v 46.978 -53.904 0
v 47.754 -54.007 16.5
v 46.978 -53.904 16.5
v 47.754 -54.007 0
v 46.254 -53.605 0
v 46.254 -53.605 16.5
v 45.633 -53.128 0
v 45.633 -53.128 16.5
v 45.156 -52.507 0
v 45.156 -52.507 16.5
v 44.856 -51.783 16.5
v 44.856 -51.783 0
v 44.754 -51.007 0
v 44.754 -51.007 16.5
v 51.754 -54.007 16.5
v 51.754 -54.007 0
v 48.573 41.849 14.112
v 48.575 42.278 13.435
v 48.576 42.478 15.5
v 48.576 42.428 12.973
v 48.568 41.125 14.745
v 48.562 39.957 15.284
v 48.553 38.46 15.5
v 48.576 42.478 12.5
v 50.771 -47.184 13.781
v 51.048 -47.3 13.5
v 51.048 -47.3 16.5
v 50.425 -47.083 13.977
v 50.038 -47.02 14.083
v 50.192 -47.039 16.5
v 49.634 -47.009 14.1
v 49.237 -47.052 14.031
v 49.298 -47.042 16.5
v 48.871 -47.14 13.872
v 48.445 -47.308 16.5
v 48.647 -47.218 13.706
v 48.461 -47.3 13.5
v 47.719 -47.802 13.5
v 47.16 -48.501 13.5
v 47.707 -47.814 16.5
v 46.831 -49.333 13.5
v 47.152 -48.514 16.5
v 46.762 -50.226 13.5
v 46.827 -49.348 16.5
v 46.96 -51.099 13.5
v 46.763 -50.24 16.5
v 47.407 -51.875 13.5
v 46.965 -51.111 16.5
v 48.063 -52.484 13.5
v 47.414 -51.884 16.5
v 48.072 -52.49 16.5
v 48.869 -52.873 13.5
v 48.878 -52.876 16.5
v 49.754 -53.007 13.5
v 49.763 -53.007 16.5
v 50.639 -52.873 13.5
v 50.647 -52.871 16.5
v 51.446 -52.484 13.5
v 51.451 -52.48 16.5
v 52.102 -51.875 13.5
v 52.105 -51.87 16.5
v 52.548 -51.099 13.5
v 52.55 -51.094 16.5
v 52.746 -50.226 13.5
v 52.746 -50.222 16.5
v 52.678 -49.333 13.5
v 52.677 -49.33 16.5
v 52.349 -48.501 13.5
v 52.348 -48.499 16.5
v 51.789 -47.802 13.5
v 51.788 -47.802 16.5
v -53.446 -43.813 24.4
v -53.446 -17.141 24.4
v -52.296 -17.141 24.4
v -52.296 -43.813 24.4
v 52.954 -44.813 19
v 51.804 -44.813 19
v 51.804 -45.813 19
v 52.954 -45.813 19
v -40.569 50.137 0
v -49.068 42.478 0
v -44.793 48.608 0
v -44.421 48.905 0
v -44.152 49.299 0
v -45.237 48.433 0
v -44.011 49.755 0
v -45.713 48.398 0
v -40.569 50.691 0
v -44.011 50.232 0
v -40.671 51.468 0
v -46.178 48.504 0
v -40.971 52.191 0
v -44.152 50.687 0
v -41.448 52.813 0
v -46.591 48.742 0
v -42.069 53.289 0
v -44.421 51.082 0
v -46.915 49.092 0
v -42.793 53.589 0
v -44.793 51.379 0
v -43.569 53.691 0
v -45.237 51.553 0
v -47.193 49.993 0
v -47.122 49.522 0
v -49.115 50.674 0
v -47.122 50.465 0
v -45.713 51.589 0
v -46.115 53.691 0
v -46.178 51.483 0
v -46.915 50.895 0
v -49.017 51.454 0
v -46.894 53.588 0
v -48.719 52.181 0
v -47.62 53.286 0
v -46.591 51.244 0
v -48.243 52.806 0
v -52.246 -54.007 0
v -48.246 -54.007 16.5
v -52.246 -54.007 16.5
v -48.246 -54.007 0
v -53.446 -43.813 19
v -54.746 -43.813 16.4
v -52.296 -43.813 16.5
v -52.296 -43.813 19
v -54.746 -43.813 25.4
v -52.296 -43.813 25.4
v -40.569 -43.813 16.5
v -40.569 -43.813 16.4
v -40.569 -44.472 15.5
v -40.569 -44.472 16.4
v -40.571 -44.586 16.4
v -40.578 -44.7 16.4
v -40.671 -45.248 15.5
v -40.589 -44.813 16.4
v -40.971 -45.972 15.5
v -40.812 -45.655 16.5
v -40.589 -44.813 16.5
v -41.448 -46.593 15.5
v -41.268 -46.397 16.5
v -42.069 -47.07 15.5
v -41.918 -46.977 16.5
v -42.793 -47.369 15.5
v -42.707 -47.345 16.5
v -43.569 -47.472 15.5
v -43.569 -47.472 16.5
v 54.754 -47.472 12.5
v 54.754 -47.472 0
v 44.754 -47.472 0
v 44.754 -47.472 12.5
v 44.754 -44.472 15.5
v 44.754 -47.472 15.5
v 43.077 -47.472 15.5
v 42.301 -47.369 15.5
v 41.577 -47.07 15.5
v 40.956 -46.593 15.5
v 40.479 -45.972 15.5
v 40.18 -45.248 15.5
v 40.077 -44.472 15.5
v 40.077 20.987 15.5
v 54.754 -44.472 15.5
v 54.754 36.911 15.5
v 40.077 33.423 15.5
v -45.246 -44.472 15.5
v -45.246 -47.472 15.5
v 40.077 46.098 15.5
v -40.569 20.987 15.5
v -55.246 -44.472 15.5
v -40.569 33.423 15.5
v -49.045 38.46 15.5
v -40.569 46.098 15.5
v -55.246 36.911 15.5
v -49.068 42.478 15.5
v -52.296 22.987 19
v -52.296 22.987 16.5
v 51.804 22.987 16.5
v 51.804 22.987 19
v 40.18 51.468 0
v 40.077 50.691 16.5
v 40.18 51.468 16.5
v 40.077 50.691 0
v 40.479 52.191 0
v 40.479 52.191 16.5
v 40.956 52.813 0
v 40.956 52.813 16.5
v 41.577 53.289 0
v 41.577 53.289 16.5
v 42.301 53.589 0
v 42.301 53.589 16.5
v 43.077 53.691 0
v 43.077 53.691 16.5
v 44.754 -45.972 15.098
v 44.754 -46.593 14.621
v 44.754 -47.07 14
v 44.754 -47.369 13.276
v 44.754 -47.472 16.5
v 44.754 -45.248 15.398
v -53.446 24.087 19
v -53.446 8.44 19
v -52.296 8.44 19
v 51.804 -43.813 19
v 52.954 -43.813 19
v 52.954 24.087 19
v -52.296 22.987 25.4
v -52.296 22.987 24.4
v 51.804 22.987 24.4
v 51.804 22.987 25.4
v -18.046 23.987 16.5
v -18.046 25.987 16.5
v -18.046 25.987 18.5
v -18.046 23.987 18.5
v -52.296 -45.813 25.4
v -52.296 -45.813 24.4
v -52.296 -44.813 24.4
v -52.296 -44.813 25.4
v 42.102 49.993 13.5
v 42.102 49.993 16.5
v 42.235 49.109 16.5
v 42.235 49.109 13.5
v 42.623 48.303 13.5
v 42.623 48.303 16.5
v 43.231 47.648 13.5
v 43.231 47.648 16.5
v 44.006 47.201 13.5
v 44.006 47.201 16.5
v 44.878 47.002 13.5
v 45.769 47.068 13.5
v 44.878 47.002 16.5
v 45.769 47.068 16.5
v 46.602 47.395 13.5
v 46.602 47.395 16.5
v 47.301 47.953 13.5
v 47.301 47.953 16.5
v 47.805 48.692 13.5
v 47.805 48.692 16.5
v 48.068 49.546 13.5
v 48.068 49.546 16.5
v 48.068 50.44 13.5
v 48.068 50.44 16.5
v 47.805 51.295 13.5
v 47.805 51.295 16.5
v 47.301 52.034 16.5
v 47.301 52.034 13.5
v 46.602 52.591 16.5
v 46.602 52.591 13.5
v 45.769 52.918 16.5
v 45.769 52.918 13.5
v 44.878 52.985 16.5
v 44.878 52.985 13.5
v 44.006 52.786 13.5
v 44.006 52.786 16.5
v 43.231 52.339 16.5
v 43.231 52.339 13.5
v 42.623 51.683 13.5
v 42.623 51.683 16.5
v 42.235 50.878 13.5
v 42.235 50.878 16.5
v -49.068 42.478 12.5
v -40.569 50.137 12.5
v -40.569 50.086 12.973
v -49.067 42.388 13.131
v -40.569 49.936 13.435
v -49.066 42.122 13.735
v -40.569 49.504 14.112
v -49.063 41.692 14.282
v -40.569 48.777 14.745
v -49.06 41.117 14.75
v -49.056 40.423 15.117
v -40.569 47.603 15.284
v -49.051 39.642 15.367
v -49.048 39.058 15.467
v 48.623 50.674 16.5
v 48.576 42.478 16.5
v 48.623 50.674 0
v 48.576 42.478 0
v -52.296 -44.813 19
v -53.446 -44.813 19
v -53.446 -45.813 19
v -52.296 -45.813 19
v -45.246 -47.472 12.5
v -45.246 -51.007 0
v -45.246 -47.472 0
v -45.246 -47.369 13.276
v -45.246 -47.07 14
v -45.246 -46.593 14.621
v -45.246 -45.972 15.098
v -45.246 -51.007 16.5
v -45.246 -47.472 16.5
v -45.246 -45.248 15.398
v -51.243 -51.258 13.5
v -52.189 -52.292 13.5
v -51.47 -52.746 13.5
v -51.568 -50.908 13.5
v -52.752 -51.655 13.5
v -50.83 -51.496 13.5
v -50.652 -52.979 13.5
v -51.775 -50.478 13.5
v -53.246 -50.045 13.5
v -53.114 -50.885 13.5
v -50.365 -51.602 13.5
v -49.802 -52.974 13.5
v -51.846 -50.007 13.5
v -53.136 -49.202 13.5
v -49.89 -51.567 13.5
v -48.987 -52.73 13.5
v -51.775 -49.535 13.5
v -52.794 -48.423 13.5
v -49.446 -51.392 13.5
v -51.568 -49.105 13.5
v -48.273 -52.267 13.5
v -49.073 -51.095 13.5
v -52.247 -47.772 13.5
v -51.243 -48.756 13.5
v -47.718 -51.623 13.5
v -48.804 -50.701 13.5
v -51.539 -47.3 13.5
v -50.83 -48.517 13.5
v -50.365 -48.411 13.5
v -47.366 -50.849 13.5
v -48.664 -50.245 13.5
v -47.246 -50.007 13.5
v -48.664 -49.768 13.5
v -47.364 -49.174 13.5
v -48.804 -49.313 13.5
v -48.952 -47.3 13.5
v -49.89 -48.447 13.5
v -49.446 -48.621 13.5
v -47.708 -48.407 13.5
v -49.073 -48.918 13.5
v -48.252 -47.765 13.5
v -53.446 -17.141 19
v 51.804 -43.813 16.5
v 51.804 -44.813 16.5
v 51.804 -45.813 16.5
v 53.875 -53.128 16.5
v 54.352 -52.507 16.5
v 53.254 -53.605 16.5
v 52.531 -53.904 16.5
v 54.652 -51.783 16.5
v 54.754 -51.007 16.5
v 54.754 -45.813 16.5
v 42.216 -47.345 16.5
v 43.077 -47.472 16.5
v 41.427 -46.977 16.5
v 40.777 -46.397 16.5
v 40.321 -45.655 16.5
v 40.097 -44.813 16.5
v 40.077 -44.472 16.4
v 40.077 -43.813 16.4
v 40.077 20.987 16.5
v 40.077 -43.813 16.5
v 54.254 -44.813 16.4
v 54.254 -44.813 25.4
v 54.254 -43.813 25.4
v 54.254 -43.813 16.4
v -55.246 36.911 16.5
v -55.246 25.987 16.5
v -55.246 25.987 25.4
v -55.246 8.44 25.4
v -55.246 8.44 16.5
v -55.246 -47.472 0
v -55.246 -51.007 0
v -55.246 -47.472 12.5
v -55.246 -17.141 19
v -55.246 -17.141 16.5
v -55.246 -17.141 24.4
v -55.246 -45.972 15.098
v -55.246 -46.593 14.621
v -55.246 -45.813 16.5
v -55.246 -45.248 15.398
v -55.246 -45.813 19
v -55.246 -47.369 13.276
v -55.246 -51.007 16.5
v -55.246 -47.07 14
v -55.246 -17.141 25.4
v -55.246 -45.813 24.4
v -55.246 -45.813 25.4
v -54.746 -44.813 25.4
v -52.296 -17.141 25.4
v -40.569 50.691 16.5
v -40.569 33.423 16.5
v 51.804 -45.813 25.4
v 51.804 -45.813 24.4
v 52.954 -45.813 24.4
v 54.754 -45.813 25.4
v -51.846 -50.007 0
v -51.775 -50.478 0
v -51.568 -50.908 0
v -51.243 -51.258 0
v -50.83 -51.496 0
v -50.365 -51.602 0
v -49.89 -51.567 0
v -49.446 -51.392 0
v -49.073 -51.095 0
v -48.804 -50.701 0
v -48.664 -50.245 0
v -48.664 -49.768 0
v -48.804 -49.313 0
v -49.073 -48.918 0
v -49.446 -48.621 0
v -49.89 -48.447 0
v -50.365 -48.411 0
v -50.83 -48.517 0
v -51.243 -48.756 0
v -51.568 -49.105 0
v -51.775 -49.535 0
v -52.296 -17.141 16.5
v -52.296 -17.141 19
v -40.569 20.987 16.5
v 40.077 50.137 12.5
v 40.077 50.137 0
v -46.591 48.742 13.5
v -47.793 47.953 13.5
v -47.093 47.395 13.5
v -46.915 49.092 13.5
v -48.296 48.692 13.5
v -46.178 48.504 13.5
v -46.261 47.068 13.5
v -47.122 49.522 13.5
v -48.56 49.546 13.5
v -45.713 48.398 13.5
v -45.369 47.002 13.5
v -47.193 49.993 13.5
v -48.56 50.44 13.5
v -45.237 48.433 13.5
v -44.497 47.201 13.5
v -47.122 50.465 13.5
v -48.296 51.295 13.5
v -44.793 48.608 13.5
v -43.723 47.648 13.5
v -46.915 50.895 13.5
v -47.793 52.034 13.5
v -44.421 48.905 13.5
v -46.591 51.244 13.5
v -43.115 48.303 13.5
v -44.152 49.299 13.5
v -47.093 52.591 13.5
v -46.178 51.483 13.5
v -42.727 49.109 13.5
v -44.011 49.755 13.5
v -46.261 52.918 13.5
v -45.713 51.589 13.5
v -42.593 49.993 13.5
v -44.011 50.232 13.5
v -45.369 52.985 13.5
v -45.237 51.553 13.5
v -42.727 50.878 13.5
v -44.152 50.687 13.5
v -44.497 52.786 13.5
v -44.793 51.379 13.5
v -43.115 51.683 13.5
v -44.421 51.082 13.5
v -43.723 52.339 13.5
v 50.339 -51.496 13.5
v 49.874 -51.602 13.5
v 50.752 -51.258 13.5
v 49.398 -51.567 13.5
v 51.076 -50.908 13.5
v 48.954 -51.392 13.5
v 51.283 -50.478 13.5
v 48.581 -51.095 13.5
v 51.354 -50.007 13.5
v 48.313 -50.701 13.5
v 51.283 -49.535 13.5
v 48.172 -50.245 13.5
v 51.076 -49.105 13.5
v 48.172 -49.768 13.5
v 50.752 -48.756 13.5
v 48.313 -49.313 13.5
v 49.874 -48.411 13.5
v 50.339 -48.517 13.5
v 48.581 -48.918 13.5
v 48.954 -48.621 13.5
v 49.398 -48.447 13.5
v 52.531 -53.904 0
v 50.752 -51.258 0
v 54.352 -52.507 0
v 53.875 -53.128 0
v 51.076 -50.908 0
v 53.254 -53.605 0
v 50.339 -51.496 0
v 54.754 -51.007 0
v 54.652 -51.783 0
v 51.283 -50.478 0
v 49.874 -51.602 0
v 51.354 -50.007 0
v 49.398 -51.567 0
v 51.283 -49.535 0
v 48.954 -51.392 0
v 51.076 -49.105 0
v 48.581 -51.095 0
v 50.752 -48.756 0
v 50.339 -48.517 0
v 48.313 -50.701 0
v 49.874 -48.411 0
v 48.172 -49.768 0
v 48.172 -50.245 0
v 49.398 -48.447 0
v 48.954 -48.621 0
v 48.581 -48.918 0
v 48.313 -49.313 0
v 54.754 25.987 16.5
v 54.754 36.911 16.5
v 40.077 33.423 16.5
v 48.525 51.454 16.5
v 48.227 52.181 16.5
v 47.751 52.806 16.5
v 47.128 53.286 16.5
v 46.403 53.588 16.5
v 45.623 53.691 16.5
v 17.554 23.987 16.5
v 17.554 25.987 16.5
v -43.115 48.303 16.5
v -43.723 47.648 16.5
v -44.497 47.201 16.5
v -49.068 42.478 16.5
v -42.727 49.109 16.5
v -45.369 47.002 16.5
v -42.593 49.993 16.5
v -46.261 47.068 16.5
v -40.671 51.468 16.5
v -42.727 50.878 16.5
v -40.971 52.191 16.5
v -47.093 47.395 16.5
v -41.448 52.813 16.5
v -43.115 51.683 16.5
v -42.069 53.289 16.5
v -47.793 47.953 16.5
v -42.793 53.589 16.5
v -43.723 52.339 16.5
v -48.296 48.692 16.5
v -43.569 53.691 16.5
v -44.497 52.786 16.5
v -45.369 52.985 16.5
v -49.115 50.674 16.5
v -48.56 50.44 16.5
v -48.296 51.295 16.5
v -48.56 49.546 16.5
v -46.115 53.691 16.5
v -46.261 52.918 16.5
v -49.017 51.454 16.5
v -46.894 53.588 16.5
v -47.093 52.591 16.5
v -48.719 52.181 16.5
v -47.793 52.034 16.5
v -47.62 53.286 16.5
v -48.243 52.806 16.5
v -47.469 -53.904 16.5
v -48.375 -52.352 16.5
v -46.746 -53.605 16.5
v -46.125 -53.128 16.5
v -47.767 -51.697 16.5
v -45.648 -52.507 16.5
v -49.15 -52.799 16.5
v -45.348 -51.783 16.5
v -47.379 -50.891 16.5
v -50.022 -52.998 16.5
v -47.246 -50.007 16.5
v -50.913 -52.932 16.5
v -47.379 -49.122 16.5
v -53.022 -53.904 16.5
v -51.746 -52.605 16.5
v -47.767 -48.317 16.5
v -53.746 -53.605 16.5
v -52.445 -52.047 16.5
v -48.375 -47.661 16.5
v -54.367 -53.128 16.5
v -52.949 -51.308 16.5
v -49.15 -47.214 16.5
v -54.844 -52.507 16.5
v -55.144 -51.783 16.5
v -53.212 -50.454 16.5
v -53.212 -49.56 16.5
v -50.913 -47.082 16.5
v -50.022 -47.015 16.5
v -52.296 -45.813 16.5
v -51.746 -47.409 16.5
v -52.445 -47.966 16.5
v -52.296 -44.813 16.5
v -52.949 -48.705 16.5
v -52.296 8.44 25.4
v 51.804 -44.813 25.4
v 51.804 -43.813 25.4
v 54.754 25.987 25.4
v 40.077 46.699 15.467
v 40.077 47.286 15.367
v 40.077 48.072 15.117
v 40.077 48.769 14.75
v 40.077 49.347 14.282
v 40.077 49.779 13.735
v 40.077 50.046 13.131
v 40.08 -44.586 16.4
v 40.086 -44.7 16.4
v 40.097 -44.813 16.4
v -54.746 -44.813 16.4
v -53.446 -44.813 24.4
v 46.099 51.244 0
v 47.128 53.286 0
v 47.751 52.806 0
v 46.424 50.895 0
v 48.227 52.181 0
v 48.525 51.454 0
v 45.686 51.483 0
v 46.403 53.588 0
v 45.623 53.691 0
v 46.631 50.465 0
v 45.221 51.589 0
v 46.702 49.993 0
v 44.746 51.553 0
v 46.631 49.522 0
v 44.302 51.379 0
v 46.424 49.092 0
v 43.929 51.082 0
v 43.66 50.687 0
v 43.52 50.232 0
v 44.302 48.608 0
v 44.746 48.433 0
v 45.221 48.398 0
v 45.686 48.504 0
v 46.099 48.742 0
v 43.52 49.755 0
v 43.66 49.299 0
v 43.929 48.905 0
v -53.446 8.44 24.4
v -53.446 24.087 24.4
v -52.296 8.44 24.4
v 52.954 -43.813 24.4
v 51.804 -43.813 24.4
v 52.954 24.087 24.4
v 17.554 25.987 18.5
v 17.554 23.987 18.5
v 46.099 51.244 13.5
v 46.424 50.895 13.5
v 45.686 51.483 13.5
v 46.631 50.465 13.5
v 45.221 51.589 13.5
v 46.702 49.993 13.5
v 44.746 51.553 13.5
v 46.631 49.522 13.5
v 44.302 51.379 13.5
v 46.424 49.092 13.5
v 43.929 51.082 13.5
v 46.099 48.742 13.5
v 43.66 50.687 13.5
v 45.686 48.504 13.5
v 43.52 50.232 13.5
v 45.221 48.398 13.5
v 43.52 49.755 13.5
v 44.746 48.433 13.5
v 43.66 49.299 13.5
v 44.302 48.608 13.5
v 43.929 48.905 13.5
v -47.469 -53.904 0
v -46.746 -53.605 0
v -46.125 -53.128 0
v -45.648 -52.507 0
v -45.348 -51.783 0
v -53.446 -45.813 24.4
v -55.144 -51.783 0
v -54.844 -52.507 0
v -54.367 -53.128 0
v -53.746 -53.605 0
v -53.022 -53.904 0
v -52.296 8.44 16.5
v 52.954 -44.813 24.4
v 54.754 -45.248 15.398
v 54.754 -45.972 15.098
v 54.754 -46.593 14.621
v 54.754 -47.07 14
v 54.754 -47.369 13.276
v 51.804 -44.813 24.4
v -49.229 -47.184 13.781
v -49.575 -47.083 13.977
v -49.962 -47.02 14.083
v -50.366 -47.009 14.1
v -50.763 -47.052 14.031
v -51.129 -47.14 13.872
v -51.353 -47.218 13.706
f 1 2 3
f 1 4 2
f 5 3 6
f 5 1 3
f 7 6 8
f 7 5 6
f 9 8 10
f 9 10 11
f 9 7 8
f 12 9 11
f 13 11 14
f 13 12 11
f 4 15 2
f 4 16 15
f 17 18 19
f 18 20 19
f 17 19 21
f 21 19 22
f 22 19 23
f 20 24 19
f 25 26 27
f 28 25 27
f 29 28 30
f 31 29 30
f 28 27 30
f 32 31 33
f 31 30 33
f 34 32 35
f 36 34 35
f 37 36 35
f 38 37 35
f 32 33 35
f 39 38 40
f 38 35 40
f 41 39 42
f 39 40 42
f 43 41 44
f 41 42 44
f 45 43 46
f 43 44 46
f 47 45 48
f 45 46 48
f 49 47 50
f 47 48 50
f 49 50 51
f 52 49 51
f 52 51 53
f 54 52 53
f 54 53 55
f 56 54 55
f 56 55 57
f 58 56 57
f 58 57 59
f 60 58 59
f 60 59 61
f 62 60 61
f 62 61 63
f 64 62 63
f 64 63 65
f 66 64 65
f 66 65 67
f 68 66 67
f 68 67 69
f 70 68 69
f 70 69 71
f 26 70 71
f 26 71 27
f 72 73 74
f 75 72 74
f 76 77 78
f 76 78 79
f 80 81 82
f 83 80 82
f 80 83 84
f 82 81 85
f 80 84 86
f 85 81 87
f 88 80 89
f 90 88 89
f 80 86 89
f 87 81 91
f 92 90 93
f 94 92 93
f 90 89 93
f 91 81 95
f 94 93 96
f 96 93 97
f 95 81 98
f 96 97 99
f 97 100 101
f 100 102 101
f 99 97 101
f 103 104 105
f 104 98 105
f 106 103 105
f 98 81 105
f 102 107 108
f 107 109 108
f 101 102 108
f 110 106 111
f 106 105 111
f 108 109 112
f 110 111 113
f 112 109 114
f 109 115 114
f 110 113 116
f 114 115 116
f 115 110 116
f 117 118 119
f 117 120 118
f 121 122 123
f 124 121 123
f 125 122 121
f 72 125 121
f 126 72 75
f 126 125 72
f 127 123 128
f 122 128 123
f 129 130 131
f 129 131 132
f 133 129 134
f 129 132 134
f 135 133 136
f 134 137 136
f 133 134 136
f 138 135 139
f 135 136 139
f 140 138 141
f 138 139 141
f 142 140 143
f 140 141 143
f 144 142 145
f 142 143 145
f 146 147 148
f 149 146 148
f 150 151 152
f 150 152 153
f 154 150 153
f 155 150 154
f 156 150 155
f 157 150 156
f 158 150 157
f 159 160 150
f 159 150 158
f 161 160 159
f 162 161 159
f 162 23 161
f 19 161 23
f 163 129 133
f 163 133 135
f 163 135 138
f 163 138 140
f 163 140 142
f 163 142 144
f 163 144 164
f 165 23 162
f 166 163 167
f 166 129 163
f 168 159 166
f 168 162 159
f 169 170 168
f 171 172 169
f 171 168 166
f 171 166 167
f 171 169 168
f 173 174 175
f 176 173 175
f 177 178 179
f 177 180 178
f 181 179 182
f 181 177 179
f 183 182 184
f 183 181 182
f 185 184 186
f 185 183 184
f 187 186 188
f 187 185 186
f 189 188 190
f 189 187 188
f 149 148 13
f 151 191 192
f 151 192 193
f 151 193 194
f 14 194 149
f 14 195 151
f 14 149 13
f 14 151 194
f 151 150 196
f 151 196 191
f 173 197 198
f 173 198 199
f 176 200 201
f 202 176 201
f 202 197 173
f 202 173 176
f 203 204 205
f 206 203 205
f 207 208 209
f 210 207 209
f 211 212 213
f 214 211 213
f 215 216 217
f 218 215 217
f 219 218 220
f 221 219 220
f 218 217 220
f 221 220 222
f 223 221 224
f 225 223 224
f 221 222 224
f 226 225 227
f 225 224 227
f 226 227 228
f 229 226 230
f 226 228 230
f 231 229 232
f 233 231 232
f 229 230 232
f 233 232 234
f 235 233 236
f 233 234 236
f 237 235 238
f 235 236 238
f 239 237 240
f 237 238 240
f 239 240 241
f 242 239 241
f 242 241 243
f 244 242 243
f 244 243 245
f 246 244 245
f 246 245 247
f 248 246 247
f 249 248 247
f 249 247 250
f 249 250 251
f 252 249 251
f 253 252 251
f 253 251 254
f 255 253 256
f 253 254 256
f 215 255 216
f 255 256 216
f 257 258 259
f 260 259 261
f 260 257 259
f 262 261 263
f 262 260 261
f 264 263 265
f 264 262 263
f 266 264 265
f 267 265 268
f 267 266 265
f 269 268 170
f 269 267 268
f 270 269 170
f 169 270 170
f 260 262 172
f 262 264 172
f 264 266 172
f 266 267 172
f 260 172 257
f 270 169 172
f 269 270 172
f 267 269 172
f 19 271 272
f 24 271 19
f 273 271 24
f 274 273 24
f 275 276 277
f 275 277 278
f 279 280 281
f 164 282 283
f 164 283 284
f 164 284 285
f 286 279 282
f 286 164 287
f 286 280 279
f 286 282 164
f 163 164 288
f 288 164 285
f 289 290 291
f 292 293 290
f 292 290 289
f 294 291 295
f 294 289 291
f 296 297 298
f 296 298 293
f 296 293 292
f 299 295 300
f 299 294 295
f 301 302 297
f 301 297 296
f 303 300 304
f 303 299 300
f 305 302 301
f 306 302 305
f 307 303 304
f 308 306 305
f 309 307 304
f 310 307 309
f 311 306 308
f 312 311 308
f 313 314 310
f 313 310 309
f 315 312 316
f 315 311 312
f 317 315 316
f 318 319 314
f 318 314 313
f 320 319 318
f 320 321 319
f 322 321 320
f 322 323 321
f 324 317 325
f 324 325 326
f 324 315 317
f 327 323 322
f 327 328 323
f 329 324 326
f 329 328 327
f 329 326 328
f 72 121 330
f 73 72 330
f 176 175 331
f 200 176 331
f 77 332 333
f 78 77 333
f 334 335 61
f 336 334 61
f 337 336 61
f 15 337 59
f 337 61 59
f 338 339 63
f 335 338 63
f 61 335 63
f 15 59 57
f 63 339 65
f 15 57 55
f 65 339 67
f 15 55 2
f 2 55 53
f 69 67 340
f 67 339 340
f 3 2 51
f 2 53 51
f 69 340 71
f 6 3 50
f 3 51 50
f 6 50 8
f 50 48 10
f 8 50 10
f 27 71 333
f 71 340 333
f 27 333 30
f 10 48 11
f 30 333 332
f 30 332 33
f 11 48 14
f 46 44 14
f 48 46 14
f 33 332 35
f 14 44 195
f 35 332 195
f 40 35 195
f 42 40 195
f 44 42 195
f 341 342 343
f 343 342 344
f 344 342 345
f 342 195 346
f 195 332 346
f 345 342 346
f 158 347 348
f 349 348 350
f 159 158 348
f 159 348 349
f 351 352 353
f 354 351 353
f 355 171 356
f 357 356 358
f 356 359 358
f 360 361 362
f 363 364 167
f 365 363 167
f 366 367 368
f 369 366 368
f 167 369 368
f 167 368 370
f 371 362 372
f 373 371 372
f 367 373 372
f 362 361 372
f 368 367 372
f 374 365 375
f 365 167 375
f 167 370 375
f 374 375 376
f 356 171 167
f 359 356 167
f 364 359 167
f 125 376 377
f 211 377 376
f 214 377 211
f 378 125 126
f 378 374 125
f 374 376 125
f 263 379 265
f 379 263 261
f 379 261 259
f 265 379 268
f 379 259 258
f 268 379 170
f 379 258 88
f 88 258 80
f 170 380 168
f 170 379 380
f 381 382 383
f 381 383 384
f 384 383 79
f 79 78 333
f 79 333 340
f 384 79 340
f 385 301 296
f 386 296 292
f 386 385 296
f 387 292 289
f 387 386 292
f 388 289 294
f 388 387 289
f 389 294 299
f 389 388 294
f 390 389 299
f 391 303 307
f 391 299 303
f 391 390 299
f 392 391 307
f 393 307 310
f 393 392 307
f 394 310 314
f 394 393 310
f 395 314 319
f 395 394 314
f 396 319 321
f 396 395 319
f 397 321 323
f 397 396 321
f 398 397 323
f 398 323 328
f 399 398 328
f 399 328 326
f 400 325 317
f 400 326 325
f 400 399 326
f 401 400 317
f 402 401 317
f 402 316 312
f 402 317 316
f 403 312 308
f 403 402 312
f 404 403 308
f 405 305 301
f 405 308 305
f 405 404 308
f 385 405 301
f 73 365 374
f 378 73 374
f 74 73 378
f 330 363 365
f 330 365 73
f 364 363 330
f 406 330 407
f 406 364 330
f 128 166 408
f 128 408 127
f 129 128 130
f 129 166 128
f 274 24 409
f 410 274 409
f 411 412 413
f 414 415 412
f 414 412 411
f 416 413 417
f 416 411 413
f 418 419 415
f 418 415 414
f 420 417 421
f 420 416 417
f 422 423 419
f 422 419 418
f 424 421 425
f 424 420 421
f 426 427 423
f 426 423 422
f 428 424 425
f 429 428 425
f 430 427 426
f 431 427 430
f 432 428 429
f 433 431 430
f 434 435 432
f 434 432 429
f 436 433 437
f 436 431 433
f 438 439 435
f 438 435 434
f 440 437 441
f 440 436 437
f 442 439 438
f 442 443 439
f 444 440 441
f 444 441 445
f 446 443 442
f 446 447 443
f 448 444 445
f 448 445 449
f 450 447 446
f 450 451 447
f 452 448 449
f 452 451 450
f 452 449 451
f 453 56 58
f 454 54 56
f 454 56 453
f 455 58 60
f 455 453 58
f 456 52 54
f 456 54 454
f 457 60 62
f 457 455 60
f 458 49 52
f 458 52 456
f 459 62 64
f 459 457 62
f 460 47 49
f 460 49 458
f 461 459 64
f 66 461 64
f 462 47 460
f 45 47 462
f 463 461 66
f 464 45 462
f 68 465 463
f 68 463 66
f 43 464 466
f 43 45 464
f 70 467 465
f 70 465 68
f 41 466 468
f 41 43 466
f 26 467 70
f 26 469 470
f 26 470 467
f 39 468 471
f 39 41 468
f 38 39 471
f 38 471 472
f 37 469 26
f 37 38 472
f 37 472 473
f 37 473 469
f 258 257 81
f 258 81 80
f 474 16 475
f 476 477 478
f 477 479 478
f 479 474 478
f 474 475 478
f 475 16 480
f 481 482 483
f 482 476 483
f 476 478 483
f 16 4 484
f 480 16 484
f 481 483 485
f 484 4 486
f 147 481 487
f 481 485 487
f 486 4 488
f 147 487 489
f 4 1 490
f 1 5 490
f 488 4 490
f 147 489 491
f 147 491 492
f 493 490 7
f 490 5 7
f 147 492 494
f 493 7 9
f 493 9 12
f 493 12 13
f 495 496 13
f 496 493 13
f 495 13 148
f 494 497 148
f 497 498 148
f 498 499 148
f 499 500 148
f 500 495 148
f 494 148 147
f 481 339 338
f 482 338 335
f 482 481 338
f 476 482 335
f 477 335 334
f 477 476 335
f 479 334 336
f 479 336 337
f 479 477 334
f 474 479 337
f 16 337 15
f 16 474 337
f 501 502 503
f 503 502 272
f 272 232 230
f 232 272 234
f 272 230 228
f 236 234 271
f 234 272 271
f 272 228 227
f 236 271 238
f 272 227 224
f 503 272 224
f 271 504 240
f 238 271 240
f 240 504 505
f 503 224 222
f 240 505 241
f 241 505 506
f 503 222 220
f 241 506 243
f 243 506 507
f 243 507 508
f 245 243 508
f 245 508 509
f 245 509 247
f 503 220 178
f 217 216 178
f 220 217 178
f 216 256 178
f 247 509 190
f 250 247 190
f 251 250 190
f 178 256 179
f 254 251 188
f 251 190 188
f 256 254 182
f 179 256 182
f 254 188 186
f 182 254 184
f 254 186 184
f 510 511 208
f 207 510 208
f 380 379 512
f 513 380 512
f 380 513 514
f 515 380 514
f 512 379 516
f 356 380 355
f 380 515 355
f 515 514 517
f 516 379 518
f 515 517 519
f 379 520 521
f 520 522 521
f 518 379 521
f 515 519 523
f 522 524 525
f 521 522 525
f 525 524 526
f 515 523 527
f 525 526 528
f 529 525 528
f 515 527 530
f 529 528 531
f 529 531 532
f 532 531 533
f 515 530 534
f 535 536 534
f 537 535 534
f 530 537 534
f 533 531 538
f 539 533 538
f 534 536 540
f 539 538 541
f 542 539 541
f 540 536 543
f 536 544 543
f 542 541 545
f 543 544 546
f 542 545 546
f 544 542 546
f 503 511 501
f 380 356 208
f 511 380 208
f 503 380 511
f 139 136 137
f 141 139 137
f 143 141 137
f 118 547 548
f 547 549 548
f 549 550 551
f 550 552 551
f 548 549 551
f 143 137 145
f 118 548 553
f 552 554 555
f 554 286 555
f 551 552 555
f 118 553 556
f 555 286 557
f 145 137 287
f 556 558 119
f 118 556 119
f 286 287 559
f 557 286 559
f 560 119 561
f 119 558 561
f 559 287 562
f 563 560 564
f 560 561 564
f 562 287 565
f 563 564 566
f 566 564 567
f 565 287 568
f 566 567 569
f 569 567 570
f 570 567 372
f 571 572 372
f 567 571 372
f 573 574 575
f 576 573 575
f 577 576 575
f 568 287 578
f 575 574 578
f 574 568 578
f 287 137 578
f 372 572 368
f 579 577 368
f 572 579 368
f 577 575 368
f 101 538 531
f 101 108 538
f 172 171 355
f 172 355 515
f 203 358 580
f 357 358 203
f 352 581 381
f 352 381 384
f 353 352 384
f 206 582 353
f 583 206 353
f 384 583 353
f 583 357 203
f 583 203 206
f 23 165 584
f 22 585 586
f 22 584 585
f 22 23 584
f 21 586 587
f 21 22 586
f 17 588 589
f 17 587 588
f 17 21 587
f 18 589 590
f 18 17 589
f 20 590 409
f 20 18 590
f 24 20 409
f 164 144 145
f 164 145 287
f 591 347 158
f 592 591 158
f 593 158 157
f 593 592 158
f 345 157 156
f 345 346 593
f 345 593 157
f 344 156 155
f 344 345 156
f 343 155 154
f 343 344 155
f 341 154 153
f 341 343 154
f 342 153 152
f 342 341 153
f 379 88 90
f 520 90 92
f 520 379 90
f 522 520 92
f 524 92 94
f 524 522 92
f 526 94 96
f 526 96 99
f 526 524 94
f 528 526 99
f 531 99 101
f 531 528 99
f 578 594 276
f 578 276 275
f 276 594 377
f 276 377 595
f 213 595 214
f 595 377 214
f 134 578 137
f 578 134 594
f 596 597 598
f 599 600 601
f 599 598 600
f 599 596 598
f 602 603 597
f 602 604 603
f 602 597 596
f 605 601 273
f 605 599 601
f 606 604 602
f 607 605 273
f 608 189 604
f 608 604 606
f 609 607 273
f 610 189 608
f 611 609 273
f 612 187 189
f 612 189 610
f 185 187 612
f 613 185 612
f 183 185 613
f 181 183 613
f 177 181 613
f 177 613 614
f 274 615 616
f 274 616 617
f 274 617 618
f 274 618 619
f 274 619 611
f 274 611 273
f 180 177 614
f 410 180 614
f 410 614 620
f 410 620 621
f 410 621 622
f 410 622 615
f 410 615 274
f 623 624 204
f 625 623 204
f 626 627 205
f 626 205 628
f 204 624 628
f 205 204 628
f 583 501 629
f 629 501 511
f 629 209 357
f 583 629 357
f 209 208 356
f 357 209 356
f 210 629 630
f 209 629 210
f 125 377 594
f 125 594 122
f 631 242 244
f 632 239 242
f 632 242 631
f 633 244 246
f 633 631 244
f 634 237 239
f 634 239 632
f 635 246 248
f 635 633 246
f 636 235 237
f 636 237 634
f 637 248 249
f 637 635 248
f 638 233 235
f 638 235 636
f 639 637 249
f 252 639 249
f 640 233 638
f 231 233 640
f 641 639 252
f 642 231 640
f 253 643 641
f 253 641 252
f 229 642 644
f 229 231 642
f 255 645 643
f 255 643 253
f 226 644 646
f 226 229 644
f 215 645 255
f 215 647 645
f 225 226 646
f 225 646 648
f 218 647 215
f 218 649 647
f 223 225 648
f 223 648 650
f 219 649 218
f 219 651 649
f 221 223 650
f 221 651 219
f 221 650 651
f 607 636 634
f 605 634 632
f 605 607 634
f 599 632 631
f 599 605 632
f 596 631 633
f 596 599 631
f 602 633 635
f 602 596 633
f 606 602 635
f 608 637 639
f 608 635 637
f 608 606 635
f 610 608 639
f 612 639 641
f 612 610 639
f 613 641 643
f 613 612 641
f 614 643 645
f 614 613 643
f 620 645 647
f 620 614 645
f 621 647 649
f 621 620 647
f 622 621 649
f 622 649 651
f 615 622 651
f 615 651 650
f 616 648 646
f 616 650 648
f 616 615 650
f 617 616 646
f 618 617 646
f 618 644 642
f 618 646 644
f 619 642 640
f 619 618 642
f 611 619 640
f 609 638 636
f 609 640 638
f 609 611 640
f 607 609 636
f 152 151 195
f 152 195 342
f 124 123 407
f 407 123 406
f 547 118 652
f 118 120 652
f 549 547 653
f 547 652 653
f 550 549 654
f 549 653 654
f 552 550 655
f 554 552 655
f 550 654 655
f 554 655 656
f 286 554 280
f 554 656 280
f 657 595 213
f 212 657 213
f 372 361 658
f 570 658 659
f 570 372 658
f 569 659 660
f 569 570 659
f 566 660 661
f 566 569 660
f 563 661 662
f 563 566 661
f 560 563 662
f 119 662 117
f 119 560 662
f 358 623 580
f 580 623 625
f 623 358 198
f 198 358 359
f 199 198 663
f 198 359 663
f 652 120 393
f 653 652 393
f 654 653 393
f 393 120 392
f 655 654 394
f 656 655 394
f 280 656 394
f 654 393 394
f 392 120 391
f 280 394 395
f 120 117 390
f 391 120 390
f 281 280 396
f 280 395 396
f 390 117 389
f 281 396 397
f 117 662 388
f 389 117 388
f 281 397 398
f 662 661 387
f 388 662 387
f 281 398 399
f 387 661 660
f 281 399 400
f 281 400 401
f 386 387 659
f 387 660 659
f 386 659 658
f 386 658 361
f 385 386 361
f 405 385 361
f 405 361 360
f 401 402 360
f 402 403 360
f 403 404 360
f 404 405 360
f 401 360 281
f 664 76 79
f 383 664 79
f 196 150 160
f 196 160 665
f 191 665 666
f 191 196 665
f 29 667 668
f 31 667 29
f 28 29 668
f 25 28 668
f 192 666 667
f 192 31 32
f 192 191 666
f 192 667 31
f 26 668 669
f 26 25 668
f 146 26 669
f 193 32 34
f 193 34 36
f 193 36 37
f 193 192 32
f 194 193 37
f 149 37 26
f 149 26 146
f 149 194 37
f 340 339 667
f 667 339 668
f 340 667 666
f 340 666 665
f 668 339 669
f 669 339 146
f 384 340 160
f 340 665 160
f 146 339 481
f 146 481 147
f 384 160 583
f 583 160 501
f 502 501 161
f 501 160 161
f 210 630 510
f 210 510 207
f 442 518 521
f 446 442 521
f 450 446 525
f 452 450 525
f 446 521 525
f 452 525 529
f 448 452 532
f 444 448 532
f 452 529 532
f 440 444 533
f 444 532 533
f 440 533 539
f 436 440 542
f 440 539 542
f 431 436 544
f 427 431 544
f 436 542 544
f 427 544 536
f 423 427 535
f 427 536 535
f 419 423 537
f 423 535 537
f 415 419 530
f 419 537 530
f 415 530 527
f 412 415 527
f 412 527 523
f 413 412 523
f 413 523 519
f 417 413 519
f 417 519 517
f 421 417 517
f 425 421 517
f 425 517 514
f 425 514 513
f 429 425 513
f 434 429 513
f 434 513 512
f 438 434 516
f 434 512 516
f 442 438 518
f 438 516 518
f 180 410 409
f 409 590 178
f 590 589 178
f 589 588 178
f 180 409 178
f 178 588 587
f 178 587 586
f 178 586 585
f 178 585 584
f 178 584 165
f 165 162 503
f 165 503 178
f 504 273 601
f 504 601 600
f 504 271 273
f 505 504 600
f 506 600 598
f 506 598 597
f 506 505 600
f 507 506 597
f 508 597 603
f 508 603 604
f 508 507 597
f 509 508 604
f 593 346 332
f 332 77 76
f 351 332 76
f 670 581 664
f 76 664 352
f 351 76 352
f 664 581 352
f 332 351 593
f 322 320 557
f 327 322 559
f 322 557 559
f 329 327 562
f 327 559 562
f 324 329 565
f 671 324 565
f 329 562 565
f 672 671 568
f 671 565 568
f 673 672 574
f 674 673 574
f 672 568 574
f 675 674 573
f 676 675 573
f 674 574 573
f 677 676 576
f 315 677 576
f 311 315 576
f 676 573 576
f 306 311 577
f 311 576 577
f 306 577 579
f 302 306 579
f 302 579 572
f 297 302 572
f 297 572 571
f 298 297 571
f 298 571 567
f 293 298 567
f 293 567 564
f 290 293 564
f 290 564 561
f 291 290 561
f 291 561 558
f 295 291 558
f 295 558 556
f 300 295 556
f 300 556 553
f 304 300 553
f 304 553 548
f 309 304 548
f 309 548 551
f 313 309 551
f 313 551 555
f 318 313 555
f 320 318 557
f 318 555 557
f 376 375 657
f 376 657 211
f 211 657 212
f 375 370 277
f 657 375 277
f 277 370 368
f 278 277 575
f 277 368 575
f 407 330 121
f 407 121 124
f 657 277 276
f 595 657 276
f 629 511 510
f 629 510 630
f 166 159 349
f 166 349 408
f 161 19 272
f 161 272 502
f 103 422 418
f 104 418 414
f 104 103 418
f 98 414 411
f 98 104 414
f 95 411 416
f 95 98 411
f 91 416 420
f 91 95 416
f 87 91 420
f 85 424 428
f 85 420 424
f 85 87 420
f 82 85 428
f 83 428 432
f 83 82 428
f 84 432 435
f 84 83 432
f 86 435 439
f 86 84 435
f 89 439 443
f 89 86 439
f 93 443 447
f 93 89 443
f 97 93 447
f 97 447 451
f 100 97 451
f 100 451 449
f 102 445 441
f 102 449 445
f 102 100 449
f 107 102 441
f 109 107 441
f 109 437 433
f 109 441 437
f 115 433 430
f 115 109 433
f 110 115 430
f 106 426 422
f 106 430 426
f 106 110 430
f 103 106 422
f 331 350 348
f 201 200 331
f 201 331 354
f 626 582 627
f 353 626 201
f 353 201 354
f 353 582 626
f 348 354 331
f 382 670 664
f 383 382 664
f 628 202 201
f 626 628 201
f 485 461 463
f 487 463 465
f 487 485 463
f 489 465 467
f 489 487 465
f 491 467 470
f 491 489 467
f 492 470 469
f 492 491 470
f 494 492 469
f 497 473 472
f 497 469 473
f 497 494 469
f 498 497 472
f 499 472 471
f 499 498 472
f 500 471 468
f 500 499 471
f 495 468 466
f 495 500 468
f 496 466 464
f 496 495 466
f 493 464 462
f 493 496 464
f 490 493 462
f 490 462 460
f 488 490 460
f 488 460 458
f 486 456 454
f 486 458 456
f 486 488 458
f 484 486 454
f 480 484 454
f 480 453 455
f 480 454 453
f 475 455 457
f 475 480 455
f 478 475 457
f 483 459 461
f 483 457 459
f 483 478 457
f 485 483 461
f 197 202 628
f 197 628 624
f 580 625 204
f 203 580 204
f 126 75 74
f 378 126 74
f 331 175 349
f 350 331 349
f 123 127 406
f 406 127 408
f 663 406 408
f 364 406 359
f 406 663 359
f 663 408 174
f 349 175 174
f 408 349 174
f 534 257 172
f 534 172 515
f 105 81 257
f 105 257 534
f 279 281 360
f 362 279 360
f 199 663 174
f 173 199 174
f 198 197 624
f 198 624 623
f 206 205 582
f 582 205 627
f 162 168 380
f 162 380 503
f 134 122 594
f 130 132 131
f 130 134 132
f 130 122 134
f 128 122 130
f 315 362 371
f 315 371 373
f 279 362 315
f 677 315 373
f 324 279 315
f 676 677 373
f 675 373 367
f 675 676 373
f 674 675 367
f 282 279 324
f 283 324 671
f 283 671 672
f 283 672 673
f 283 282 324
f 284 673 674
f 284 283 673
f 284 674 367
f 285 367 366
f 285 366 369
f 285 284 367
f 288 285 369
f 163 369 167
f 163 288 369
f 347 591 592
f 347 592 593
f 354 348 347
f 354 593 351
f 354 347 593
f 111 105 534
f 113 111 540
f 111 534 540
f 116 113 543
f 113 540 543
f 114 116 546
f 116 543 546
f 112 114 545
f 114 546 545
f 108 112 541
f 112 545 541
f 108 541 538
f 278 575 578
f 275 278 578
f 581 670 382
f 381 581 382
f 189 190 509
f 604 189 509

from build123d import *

# Parameters (mm, degrees)
SKETCH1_W             = 6.535180092
SKETCH1_H             = 10
SKETCH1_R             = 1.6
BOSS_EXTRUDE1_DEPTH   = 15.5
BOSS_EXTRUDE1_2_DEPTH = 15.5
BOSS_EXTRUDE1_3_DEPTH = 15.5
BOSS_EXTRUDE1_4_DEPTH = 15.5
SKETCH2_R             = 1.6
BOSS_EXTRUDE2_DEPTH   = 1
SKETCH3_W             = 2.95
SKETCH3_H             = 28.672472045
BOSS_EXTRUDE3_DEPTH   = 2.5
BOSS_EXTRUDE4_DEPTH   = 5.4
SKETCH5_W             = 2.95
SKETCH5_H             = 28.672472045
BOSS_EXTRUDE5_DEPTH   = 1
SKETCH7_W             = 109
SKETCH7_H             = 1
CUT_EXTRUDE1_DEPTH    = 9
FILLET1_R             = 3
FILLET2_R             = 3
SKETCH8_W             = 35.6
SKETCH8_H             = 2
CUT_EXTRUDE2_DEPTH    = 2
SKETCH9_R             = 3
CUT_EXTRUDE3_DEPTH    = 3


with BuildPart() as part:
    # Sketch1 → Boss-Extrude1 (new body)
    with BuildSketch(Plane(origin=(0, 0, 0), x_dir=(0, 1, 0), z_dir=(0, 0, 1))):
        with Locations((-50.739127193, -49.754164457)):
            Rectangle(SKETCH1_W, SKETCH1_H)
        with Locations(Location((-50.006717239, -49.754164457, 0), (0, 0, 270))):
            Circle(SKETCH1_R, mode=Mode.SUBTRACT)
    extrude(amount=BOSS_EXTRUDE1_DEPTH)



with BuildPart() as body_2:
    # Sketch1 → Boss-Extrude1 2 (new body)
    with BuildSketch(Plane(origin=(0, 0, 0), x_dir=(0, 1, 0), z_dir=(0, 0, 1))):
        Polygon((42.477965747, -48.576148962), (50.136732851, -40.077363358), (53.691226628, -40.077363358), (53.691226628, -48.640781304), align=None)
        with Locations(Location((49.993282761, -45.101777457, 0), (0, 0, 270))):
            Circle(SKETCH1_R, mode=Mode.SUBTRACT)
    extrude(amount=BOSS_EXTRUDE1_2_DEPTH)


with BuildPart() as body_3:
    # Sketch1 → Boss-Extrude1 3 (new body)
    with BuildSketch(Plane(origin=(0, 0, 0), x_dir=(0, 1, 0), z_dir=(0, 0, 1))):
        Polygon((53.691226628, 49.132452389), (42.477965747, 49.067820047), (50.136732851, 40.569034443), (53.691226628, 40.569034443), align=None)
        with Locations(Location((49.993282761, 45.593448542, 0), (0, 0, 90))):
            Circle(SKETCH1_R, mode=Mode.SUBTRACT)
    extrude(amount=BOSS_EXTRUDE1_3_DEPTH)


with BuildPart() as body_4:
    # Sketch1 → Boss-Extrude1 4 (new body)
    with BuildSketch(Plane(origin=(0, 0, 0), x_dir=(0, 1, 0), z_dir=(0, 0, 1))):
        with Locations((-50.739127193, 50.245835543)):
            Rectangle(SKETCH1_W, SKETCH1_H)
        with Locations(Location((-50.006717239, 50.245835543, 0), (0, 0, 90))):
            Circle(SKETCH1_R, mode=Mode.SUBTRACT)
    extrude(amount=BOSS_EXTRUDE1_4_DEPTH)


with BuildPart() as part_1:
    add(part.part)

    add(body_2.part)  # Boss-Extrude2 merges body 2

    add(body_3.part)  # Boss-Extrude2 merges body 3

    add(body_4.part)  # Boss-Extrude2 merges body 4
    # Sketch2 → Boss-Extrude2 (add)
    with BuildSketch(Plane.XY.offset(15.5)):
        Polygon((54.754164457, -47.471537147), (54.754164457, -54.006717239), (44.754164457, -54.006717239), (44.754164457, -47.471537147), (40.077363358, -47.471537147), (40.077363358, 20.986771333), (-40.569034443, 20.986771333), (-40.569034443, -47.471537147), (-45.245835543, -47.471537147), (-45.245835543, -54.006717239), (-55.245835543, -54.006717239), (-55.245835543, -47.471537147), (-55.245835543, 36.910584236), (-49.067820047, 42.477965747), (-49.132452389, 53.691226628), (-40.569034443, 53.691226628), (-40.569034443, 33.42328432), (40.077363358, 33.42328432), (40.077363358, 53.691226628), (48.640781304, 53.691226628), (48.576148962, 42.477965747), (54.754164457, 36.910584236), align=None)
        with Locations((49.754164457, -50.006717239)):
            Circle(SKETCH2_R, mode=Mode.SUBTRACT)
        with Locations((45.101777457, 49.993282761)):
            Circle(SKETCH2_R, mode=Mode.SUBTRACT)
        with Locations(Location((-45.593448542, 49.993282761, 0), (0, 0, 180))):
            Circle(SKETCH2_R, mode=Mode.SUBTRACT)
        with Locations(Location((-50.245835543, -50.006717239, 0), (0, 0, 180))):
            Circle(SKETCH2_R, mode=Mode.SUBTRACT)
    extrude(amount=BOSS_EXTRUDE2_DEPTH)

    # Sketch3 → Boss-Extrude3 (add)
    with BuildSketch(Plane.XY.offset(16.5)):
        Polygon((-52.295835543, 8.439904174), (-52.295835543, 22.986771333), (51.804164457, 22.986771333), (51.804164457, -45.813228667), (54.754164457, -45.813228667), (54.754164457, 25.986771333), (-55.245835543, 25.986771333), (-55.245835543, 8.439904174), align=None)
        with Locations((-53.770835543, -31.476992645)):
            Rectangle(SKETCH3_W, SKETCH3_H)
    extrude(amount=BOSS_EXTRUDE3_DEPTH)

    # Sketch4 → Boss-Extrude4 (add)
    with BuildSketch(Plane.XY.offset(19)):
        Polygon((-55.245835543, 25.986771333), (54.754164457, 25.986771333), (54.754164457, -45.813228667), (52.954164457, -45.813228667), (52.954164457, -43.913228667), (52.954164457, 24.086771333), (-53.445835543, 24.086771333), (-53.445835543, 8.439904174), (-55.245835543, 8.439904174), align=None)
        Polygon((-55.245835543, -45.813228667), (-53.445835543, -45.813228667), (-53.445835543, -43.913228667), (-53.445835543, -17.140756622), (-55.245835543, -17.140756622), align=None)
    extrude(amount=BOSS_EXTRUDE4_DEPTH)

    # Sketch5 → Boss-Extrude5 (add)
    with BuildSketch(Plane.XY.offset(24.4)):
        Polygon((-55.245835543, 8.439904174), (-52.295835543, 8.439904174), (-52.295835543, 22.986771333), (51.804164457, 22.986771333), (51.804164457, -45.813228667), (54.754164457, -45.813228667), (54.754164457, 25.986771333), (-55.245835543, 25.986771333), align=None)
        with Locations((-53.770835543, -31.476992645)):
            Rectangle(SKETCH5_W, SKETCH5_H)
    extrude(amount=BOSS_EXTRUDE5_DEPTH)

    # Sketch7 → Cut-Extrude1 (cut)
    with BuildSketch(Plane.XY.offset(25.4)):
        with Locations((-0.245835543, -44.313228667)):
            Rectangle(SKETCH7_W, SKETCH7_H)
    extrude(amount=-CUT_EXTRUDE1_DEPTH, mode=Mode.SUBTRACT)

    # Fillet1
    fillet1_edges = [part_1.edges().sort_by_distance(p)[0] for p in [
        (48.640781304, 53.691226628, 7.75),
        (-49.132452389, 53.691226628, 7.75),
        (-40.569034443, -47.471537147, 16),
        (-55.245835543, -54.006717239, 8.25),
        (-45.245835543, -54.006717239, 8.25),
        (40.077363358, -47.471537147, 16),
        (44.754164457, -54.006717239, 8.25),
        (54.754164457, -54.006717239, 8.25),
        (40.077363358, 53.691226628, 7.75),
        (-40.569034443, 53.691226628, 7.75),
    ]]
    fillet(fillet1_edges, radius=FILLET1_R)

    # Fillet2
    # the kernel refuses this fillet: 3 mm, written as the material it adds along each edge
    with BuildSketch(Plane(origin=(54.147639825, 37.457160078, 15.5), x_dir=(0, 0, -1), z_dir=(-0.7428654483971854, 0.6694407558385198, 0))) as fillet2_piece_1_section:
        with BuildLine():
            CenterArc((FILLET2_R, FILLET2_R), FILLET2_R, 180, 90)
            Line((0, FILLET2_R), (0, 0))
            Line((0, 0), (FILLET2_R, 0))
        make_face()
    fillet2_piece_1 = extrude(amount=26.440545017, mode=Mode.PRIVATE)
    fillet2_piece_1 = split(fillet2_piece_1, bisect_by=Plane(origin=(48.592895704, 45.383408694, 14.829727011), z_dir=(-0.9999833890252455, 0.005763824562264406, 0)), keep=Keep.TOP, mode=Mode.PRIVATE)
    fillet2_piece_1 = split(fillet2_piece_1, bisect_by=Plane(origin=(40.077363358, 45.408013282, 14.829727011), z_dir=(1, 0, 0)), keep=Keep.TOP, mode=Mode.PRIVATE)
    add(fillet2_piece_1)
    with BuildSketch(Plane(origin=(-54.63931091, 37.457160078, 15.5), x_dir=(0, 0, -1), z_dir=(0.7428654483971854, 0.6694407558385198, 0))) as fillet2_piece_2_section:
        with BuildLine():
            CenterArc((FILLET2_R, -FILLET2_R), FILLET2_R, 90, 90)
            Line((0, -FILLET2_R), (0, 0))
            Line((0, 0), (FILLET2_R, 0))
        make_face()
    fillet2_piece_2 = extrude(amount=26.440545017, mode=Mode.PRIVATE)
    fillet2_piece_2 = split(fillet2_piece_2, bisect_by=Plane(origin=(-40.569034443, 45.408013282, 14.829727011), z_dir=(-1, 0, 0)), keep=Keep.TOP, mode=Mode.PRIVATE)
    fillet2_piece_2 = split(fillet2_piece_2, bisect_by=Plane(origin=(-49.084566789, 45.383408694, 14.829727011), z_dir=(0.9999833890252455, 0.005763824562264406, 0)), keep=Keep.TOP, mode=Mode.PRIVATE)
    add(fillet2_piece_2)
    with BuildSketch(Plane(origin=(-45.245835543, -47.471537147, 15.5), x_dir=(0, 0, -1), z_dir=(-1, 0, 0)), Plane(origin=(44.754164457, -47.471537147, 15.5), x_dir=(0, 1, 0), z_dir=(1, 0, 0))) as fillet2_piece_3:
        with BuildLine():
            CenterArc((FILLET2_R, -FILLET2_R), FILLET2_R, 90, 90)
            Line((0, -FILLET2_R), (0, 0))
            Line((0, 0), (FILLET2_R, 0))
        make_face()
    extrude(amount=10)

    # Sketch8 → Cut-Extrude2 (cut)
    with BuildSketch(Plane(origin=(0, 25.986771333, 0), x_dir=(-1, 0, 0), z_dir=(0, 1, 0))):
        with Locations((0.245835543, 17.5)):
            Rectangle(SKETCH8_W, SKETCH8_H)
    extrude(amount=-CUT_EXTRUDE2_DEPTH, mode=Mode.SUBTRACT)

    # Sketch9 → Cut-Extrude3 (cut)
    with BuildSketch(Plane.XY.offset(16.5)):
        with Locations((-45.593448542, 49.993282761)):
            Circle(SKETCH9_R)
        with Locations((-50.245835543, -50.006717239)):
            Circle(SKETCH9_R)
        with Locations(Location((49.754164457, -50.006717239, 0), (0, 0, 64.455545536))):
            Circle(SKETCH9_R)
        with Locations(Location((45.101777457, 49.993282761, 0), (0, 0, 180))):
            Circle(SKETCH9_R)
    extrude(amount=-CUT_EXTRUDE3_DEPTH, mode=Mode.SUBTRACT)


solid = part_1.part
